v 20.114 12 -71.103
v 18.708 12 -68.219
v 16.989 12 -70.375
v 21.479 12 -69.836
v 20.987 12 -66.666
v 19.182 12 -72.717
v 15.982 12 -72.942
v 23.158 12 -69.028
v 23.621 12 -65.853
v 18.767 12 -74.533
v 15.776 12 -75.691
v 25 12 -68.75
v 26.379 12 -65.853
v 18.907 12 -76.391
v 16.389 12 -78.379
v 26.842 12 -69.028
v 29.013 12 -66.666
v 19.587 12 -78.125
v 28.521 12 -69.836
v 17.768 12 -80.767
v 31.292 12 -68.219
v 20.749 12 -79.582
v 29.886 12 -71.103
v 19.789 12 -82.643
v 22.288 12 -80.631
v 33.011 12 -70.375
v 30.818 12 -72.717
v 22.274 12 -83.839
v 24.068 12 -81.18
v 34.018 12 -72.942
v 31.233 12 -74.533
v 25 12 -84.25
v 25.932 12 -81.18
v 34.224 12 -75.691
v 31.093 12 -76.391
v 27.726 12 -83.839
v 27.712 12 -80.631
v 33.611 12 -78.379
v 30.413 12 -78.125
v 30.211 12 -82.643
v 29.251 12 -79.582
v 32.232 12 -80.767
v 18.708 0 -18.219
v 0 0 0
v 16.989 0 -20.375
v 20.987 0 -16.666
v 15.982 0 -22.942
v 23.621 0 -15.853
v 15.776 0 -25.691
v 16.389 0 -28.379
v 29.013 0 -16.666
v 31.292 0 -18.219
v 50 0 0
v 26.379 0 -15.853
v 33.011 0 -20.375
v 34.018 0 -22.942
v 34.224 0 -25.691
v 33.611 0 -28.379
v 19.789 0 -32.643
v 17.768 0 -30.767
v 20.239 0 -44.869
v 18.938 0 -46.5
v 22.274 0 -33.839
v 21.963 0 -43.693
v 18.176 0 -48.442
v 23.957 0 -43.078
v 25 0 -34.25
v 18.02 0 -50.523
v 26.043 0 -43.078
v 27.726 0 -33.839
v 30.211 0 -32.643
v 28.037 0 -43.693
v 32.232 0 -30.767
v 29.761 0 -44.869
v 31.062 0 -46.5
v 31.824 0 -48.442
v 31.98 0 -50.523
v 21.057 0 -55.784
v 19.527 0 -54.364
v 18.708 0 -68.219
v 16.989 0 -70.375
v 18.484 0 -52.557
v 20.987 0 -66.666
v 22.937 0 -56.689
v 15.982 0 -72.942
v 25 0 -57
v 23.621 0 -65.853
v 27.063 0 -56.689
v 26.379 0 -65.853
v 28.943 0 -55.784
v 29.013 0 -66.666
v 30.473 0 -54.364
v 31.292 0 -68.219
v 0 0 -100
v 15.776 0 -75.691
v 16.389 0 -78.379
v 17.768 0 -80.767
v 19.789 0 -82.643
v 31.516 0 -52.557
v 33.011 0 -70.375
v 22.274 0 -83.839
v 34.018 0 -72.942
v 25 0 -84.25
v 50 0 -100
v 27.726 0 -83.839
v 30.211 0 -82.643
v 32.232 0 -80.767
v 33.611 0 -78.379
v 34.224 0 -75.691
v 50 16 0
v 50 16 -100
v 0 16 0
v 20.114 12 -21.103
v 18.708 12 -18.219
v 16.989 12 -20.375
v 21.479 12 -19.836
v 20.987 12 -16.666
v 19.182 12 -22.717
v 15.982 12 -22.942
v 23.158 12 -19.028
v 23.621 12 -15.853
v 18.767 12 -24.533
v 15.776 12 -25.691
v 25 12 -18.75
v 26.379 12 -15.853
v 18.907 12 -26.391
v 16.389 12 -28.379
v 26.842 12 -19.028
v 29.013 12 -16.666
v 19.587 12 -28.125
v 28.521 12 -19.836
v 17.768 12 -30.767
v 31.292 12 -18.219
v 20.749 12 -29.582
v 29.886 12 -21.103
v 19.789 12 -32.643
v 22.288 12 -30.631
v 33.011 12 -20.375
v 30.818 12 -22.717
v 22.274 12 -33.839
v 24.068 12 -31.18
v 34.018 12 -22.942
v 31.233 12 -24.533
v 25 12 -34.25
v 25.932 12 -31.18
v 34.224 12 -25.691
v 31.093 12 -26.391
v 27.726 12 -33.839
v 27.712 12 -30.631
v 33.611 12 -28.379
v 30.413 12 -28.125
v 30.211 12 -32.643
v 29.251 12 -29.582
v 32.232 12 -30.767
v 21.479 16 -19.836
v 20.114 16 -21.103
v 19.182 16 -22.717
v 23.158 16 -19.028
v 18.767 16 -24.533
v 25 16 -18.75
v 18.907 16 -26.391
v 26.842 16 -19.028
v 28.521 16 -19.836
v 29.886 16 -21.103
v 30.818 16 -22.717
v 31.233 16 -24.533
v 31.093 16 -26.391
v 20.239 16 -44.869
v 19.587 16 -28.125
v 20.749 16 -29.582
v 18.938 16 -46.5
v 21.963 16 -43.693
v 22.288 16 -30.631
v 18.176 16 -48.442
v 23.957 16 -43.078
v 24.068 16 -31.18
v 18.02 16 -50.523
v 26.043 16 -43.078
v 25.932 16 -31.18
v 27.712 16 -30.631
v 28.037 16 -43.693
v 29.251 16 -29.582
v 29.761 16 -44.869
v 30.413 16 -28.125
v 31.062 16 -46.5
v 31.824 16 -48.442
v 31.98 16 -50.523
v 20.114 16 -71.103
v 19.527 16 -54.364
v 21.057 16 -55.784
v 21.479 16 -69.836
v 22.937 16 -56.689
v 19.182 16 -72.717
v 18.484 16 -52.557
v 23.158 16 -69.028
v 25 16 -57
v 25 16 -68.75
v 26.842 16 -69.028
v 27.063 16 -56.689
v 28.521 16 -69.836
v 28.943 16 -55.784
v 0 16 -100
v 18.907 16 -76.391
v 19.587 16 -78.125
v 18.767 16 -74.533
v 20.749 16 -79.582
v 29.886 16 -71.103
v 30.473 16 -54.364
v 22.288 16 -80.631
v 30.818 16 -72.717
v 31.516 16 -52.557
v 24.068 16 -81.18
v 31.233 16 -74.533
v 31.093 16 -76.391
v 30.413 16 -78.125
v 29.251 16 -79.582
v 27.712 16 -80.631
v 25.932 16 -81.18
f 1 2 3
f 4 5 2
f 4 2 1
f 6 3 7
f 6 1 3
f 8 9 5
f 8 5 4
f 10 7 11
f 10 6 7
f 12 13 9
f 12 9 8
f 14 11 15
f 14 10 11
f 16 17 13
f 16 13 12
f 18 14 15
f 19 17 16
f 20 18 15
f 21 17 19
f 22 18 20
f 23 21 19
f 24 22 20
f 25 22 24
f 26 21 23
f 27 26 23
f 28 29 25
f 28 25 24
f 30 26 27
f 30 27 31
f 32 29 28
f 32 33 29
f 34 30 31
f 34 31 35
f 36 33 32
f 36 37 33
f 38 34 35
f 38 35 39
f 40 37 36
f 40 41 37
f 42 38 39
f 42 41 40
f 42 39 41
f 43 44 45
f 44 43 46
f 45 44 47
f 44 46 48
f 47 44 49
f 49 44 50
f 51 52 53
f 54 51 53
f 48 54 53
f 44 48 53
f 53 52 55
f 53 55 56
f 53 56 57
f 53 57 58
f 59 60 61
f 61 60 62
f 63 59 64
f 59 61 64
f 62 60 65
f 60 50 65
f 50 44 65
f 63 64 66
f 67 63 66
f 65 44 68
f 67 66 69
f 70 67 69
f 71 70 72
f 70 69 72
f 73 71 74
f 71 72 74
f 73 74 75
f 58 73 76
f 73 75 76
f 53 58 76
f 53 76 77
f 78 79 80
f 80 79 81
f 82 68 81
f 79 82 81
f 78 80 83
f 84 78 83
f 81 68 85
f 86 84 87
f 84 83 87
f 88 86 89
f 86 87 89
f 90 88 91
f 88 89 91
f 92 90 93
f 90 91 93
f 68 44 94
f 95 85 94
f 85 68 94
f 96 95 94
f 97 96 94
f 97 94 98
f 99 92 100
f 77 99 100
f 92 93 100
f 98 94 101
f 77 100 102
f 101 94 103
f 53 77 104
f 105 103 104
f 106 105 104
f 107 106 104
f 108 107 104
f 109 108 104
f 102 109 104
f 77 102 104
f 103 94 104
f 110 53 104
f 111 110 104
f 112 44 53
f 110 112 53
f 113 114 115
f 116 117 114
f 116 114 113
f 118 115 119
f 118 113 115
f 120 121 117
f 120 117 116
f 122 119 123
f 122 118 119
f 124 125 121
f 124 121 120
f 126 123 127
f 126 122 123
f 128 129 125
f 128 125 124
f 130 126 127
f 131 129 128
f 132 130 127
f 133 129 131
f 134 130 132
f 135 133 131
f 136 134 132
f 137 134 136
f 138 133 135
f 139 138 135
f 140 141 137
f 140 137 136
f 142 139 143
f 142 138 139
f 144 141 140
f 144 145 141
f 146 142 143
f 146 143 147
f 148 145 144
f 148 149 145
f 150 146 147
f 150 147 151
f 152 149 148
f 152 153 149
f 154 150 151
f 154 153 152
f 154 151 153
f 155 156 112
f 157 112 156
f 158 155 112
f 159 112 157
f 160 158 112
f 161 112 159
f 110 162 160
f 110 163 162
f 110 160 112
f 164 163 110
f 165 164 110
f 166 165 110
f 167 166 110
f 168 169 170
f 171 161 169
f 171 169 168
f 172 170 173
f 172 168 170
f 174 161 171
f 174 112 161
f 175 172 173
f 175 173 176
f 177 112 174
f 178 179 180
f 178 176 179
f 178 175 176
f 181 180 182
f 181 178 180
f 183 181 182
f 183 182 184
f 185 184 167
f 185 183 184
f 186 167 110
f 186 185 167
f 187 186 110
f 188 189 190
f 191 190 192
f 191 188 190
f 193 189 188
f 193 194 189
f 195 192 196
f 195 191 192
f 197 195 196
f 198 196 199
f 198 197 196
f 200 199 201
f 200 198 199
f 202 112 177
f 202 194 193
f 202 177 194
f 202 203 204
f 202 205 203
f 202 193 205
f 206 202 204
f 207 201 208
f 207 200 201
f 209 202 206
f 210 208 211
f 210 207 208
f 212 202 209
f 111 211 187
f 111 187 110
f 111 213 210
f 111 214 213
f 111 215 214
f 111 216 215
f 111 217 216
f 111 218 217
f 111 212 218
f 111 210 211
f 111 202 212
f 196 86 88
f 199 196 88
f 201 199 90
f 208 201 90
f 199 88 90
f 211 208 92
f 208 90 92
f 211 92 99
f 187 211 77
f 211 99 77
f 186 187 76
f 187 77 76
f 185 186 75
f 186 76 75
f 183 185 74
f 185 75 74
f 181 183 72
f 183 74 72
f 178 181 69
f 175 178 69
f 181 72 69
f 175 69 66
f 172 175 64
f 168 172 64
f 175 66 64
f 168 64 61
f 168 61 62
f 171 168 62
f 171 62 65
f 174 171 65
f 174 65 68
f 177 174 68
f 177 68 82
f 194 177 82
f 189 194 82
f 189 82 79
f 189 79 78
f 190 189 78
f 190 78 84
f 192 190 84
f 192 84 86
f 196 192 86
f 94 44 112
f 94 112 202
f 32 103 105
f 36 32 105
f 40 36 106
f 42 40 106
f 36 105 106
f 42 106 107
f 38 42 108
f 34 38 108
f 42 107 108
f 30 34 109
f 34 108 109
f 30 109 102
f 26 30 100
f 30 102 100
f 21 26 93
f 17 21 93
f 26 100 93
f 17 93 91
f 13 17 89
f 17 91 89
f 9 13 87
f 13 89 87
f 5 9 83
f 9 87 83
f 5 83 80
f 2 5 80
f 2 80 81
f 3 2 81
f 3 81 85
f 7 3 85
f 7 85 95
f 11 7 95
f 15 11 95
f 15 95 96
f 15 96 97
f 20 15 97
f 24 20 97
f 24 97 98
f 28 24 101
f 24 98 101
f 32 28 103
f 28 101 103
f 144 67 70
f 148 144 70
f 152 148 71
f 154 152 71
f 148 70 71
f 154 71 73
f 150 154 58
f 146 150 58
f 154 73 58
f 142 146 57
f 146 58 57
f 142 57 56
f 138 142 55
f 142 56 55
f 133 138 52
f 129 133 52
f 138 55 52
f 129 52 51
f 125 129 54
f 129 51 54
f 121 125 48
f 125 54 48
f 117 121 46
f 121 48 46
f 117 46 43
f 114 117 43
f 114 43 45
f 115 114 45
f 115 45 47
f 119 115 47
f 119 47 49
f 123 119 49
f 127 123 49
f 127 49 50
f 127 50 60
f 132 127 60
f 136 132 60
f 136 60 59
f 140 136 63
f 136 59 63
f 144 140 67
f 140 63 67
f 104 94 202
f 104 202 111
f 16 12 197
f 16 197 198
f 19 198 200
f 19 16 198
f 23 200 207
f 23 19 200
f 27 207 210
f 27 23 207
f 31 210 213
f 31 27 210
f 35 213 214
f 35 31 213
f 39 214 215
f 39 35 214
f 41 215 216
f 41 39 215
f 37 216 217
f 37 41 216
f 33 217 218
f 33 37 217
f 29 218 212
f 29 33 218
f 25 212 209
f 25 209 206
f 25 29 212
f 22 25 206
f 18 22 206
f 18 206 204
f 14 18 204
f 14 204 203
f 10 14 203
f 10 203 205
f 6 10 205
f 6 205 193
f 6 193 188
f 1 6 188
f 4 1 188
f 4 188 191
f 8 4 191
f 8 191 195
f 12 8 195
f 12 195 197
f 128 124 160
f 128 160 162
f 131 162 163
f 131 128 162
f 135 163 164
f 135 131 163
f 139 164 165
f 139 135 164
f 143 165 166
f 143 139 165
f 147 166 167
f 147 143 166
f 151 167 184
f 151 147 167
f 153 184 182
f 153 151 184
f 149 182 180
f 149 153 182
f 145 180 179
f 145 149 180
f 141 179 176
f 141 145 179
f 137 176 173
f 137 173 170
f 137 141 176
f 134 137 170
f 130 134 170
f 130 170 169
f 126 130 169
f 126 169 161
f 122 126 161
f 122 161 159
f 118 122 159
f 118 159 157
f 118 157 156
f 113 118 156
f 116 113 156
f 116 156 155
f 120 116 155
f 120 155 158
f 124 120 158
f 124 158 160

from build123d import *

# Parameters (mm, degrees)
SKETCH_1_W              = 50
SKETCH_1_H              = 100
SKETCH_1_R              = 6.25
EXTRUDE_1_DEPTH         = 16
HOLE_WIZARD_M16_1_D     = 14
HOLE_WIZARD_M16_1_DEPTH = 38
HOLE_WIZARD_M16_1_TIP   = 4.206024333
SKETCH_5_R              = 9.25
CUT_EXTRUDE_1_DEPTH     = 12


with BuildPart() as part:
    # 草图1 → 凸台-拉伸1 (new body)
    with BuildSketch(Plane(origin=(0, 0, 0), x_dir=(1, 0, 0), z_dir=(0, 1, 0))):
        with Locations((25, 50)):
            Rectangle(SKETCH_1_W, SKETCH_1_H)
        with Locations(Location((25, 75, 0), (0, 0, 270))):
            Circle(SKETCH_1_R, mode=Mode.SUBTRACT)
        with Locations(Location((25, 25, 0), (0, 0, 270))):
            Circle(SKETCH_1_R, mode=Mode.SUBTRACT)
    extrude(amount=EXTRUDE_1_DEPTH)

    # M16 螺纹孔1
    with Locations(Plane(origin=(25, 16, -50), x_dir=(0, 0, 1), z_dir=(0, 1, 0))):
        with Locations((0, 0)):
            Hole(HOLE_WIZARD_M16_1_D / 2, depth=HOLE_WIZARD_M16_1_DEPTH)
            with Locations((0, 0, -(HOLE_WIZARD_M16_1_DEPTH + HOLE_WIZARD_M16_1_TIP / 2))):  # 118° drill point
                Cone(0, HOLE_WIZARD_M16_1_D / 2, HOLE_WIZARD_M16_1_TIP, mode=Mode.SUBTRACT)

    # 草图5 → 切除-拉伸1 (cut)
    with BuildSketch(Plane.XZ):
        with Locations(Location((25, -25, 0), (0, 0, 270))):
            Circle(SKETCH_5_R)
        with Locations(Location((25, -75, 0), (0, 0, 270))):
            Circle(SKETCH_5_R)
    extrude(amount=-CUT_EXTRUDE_1_DEPTH, mode=Mode.SUBTRACT)


solid = part.part
